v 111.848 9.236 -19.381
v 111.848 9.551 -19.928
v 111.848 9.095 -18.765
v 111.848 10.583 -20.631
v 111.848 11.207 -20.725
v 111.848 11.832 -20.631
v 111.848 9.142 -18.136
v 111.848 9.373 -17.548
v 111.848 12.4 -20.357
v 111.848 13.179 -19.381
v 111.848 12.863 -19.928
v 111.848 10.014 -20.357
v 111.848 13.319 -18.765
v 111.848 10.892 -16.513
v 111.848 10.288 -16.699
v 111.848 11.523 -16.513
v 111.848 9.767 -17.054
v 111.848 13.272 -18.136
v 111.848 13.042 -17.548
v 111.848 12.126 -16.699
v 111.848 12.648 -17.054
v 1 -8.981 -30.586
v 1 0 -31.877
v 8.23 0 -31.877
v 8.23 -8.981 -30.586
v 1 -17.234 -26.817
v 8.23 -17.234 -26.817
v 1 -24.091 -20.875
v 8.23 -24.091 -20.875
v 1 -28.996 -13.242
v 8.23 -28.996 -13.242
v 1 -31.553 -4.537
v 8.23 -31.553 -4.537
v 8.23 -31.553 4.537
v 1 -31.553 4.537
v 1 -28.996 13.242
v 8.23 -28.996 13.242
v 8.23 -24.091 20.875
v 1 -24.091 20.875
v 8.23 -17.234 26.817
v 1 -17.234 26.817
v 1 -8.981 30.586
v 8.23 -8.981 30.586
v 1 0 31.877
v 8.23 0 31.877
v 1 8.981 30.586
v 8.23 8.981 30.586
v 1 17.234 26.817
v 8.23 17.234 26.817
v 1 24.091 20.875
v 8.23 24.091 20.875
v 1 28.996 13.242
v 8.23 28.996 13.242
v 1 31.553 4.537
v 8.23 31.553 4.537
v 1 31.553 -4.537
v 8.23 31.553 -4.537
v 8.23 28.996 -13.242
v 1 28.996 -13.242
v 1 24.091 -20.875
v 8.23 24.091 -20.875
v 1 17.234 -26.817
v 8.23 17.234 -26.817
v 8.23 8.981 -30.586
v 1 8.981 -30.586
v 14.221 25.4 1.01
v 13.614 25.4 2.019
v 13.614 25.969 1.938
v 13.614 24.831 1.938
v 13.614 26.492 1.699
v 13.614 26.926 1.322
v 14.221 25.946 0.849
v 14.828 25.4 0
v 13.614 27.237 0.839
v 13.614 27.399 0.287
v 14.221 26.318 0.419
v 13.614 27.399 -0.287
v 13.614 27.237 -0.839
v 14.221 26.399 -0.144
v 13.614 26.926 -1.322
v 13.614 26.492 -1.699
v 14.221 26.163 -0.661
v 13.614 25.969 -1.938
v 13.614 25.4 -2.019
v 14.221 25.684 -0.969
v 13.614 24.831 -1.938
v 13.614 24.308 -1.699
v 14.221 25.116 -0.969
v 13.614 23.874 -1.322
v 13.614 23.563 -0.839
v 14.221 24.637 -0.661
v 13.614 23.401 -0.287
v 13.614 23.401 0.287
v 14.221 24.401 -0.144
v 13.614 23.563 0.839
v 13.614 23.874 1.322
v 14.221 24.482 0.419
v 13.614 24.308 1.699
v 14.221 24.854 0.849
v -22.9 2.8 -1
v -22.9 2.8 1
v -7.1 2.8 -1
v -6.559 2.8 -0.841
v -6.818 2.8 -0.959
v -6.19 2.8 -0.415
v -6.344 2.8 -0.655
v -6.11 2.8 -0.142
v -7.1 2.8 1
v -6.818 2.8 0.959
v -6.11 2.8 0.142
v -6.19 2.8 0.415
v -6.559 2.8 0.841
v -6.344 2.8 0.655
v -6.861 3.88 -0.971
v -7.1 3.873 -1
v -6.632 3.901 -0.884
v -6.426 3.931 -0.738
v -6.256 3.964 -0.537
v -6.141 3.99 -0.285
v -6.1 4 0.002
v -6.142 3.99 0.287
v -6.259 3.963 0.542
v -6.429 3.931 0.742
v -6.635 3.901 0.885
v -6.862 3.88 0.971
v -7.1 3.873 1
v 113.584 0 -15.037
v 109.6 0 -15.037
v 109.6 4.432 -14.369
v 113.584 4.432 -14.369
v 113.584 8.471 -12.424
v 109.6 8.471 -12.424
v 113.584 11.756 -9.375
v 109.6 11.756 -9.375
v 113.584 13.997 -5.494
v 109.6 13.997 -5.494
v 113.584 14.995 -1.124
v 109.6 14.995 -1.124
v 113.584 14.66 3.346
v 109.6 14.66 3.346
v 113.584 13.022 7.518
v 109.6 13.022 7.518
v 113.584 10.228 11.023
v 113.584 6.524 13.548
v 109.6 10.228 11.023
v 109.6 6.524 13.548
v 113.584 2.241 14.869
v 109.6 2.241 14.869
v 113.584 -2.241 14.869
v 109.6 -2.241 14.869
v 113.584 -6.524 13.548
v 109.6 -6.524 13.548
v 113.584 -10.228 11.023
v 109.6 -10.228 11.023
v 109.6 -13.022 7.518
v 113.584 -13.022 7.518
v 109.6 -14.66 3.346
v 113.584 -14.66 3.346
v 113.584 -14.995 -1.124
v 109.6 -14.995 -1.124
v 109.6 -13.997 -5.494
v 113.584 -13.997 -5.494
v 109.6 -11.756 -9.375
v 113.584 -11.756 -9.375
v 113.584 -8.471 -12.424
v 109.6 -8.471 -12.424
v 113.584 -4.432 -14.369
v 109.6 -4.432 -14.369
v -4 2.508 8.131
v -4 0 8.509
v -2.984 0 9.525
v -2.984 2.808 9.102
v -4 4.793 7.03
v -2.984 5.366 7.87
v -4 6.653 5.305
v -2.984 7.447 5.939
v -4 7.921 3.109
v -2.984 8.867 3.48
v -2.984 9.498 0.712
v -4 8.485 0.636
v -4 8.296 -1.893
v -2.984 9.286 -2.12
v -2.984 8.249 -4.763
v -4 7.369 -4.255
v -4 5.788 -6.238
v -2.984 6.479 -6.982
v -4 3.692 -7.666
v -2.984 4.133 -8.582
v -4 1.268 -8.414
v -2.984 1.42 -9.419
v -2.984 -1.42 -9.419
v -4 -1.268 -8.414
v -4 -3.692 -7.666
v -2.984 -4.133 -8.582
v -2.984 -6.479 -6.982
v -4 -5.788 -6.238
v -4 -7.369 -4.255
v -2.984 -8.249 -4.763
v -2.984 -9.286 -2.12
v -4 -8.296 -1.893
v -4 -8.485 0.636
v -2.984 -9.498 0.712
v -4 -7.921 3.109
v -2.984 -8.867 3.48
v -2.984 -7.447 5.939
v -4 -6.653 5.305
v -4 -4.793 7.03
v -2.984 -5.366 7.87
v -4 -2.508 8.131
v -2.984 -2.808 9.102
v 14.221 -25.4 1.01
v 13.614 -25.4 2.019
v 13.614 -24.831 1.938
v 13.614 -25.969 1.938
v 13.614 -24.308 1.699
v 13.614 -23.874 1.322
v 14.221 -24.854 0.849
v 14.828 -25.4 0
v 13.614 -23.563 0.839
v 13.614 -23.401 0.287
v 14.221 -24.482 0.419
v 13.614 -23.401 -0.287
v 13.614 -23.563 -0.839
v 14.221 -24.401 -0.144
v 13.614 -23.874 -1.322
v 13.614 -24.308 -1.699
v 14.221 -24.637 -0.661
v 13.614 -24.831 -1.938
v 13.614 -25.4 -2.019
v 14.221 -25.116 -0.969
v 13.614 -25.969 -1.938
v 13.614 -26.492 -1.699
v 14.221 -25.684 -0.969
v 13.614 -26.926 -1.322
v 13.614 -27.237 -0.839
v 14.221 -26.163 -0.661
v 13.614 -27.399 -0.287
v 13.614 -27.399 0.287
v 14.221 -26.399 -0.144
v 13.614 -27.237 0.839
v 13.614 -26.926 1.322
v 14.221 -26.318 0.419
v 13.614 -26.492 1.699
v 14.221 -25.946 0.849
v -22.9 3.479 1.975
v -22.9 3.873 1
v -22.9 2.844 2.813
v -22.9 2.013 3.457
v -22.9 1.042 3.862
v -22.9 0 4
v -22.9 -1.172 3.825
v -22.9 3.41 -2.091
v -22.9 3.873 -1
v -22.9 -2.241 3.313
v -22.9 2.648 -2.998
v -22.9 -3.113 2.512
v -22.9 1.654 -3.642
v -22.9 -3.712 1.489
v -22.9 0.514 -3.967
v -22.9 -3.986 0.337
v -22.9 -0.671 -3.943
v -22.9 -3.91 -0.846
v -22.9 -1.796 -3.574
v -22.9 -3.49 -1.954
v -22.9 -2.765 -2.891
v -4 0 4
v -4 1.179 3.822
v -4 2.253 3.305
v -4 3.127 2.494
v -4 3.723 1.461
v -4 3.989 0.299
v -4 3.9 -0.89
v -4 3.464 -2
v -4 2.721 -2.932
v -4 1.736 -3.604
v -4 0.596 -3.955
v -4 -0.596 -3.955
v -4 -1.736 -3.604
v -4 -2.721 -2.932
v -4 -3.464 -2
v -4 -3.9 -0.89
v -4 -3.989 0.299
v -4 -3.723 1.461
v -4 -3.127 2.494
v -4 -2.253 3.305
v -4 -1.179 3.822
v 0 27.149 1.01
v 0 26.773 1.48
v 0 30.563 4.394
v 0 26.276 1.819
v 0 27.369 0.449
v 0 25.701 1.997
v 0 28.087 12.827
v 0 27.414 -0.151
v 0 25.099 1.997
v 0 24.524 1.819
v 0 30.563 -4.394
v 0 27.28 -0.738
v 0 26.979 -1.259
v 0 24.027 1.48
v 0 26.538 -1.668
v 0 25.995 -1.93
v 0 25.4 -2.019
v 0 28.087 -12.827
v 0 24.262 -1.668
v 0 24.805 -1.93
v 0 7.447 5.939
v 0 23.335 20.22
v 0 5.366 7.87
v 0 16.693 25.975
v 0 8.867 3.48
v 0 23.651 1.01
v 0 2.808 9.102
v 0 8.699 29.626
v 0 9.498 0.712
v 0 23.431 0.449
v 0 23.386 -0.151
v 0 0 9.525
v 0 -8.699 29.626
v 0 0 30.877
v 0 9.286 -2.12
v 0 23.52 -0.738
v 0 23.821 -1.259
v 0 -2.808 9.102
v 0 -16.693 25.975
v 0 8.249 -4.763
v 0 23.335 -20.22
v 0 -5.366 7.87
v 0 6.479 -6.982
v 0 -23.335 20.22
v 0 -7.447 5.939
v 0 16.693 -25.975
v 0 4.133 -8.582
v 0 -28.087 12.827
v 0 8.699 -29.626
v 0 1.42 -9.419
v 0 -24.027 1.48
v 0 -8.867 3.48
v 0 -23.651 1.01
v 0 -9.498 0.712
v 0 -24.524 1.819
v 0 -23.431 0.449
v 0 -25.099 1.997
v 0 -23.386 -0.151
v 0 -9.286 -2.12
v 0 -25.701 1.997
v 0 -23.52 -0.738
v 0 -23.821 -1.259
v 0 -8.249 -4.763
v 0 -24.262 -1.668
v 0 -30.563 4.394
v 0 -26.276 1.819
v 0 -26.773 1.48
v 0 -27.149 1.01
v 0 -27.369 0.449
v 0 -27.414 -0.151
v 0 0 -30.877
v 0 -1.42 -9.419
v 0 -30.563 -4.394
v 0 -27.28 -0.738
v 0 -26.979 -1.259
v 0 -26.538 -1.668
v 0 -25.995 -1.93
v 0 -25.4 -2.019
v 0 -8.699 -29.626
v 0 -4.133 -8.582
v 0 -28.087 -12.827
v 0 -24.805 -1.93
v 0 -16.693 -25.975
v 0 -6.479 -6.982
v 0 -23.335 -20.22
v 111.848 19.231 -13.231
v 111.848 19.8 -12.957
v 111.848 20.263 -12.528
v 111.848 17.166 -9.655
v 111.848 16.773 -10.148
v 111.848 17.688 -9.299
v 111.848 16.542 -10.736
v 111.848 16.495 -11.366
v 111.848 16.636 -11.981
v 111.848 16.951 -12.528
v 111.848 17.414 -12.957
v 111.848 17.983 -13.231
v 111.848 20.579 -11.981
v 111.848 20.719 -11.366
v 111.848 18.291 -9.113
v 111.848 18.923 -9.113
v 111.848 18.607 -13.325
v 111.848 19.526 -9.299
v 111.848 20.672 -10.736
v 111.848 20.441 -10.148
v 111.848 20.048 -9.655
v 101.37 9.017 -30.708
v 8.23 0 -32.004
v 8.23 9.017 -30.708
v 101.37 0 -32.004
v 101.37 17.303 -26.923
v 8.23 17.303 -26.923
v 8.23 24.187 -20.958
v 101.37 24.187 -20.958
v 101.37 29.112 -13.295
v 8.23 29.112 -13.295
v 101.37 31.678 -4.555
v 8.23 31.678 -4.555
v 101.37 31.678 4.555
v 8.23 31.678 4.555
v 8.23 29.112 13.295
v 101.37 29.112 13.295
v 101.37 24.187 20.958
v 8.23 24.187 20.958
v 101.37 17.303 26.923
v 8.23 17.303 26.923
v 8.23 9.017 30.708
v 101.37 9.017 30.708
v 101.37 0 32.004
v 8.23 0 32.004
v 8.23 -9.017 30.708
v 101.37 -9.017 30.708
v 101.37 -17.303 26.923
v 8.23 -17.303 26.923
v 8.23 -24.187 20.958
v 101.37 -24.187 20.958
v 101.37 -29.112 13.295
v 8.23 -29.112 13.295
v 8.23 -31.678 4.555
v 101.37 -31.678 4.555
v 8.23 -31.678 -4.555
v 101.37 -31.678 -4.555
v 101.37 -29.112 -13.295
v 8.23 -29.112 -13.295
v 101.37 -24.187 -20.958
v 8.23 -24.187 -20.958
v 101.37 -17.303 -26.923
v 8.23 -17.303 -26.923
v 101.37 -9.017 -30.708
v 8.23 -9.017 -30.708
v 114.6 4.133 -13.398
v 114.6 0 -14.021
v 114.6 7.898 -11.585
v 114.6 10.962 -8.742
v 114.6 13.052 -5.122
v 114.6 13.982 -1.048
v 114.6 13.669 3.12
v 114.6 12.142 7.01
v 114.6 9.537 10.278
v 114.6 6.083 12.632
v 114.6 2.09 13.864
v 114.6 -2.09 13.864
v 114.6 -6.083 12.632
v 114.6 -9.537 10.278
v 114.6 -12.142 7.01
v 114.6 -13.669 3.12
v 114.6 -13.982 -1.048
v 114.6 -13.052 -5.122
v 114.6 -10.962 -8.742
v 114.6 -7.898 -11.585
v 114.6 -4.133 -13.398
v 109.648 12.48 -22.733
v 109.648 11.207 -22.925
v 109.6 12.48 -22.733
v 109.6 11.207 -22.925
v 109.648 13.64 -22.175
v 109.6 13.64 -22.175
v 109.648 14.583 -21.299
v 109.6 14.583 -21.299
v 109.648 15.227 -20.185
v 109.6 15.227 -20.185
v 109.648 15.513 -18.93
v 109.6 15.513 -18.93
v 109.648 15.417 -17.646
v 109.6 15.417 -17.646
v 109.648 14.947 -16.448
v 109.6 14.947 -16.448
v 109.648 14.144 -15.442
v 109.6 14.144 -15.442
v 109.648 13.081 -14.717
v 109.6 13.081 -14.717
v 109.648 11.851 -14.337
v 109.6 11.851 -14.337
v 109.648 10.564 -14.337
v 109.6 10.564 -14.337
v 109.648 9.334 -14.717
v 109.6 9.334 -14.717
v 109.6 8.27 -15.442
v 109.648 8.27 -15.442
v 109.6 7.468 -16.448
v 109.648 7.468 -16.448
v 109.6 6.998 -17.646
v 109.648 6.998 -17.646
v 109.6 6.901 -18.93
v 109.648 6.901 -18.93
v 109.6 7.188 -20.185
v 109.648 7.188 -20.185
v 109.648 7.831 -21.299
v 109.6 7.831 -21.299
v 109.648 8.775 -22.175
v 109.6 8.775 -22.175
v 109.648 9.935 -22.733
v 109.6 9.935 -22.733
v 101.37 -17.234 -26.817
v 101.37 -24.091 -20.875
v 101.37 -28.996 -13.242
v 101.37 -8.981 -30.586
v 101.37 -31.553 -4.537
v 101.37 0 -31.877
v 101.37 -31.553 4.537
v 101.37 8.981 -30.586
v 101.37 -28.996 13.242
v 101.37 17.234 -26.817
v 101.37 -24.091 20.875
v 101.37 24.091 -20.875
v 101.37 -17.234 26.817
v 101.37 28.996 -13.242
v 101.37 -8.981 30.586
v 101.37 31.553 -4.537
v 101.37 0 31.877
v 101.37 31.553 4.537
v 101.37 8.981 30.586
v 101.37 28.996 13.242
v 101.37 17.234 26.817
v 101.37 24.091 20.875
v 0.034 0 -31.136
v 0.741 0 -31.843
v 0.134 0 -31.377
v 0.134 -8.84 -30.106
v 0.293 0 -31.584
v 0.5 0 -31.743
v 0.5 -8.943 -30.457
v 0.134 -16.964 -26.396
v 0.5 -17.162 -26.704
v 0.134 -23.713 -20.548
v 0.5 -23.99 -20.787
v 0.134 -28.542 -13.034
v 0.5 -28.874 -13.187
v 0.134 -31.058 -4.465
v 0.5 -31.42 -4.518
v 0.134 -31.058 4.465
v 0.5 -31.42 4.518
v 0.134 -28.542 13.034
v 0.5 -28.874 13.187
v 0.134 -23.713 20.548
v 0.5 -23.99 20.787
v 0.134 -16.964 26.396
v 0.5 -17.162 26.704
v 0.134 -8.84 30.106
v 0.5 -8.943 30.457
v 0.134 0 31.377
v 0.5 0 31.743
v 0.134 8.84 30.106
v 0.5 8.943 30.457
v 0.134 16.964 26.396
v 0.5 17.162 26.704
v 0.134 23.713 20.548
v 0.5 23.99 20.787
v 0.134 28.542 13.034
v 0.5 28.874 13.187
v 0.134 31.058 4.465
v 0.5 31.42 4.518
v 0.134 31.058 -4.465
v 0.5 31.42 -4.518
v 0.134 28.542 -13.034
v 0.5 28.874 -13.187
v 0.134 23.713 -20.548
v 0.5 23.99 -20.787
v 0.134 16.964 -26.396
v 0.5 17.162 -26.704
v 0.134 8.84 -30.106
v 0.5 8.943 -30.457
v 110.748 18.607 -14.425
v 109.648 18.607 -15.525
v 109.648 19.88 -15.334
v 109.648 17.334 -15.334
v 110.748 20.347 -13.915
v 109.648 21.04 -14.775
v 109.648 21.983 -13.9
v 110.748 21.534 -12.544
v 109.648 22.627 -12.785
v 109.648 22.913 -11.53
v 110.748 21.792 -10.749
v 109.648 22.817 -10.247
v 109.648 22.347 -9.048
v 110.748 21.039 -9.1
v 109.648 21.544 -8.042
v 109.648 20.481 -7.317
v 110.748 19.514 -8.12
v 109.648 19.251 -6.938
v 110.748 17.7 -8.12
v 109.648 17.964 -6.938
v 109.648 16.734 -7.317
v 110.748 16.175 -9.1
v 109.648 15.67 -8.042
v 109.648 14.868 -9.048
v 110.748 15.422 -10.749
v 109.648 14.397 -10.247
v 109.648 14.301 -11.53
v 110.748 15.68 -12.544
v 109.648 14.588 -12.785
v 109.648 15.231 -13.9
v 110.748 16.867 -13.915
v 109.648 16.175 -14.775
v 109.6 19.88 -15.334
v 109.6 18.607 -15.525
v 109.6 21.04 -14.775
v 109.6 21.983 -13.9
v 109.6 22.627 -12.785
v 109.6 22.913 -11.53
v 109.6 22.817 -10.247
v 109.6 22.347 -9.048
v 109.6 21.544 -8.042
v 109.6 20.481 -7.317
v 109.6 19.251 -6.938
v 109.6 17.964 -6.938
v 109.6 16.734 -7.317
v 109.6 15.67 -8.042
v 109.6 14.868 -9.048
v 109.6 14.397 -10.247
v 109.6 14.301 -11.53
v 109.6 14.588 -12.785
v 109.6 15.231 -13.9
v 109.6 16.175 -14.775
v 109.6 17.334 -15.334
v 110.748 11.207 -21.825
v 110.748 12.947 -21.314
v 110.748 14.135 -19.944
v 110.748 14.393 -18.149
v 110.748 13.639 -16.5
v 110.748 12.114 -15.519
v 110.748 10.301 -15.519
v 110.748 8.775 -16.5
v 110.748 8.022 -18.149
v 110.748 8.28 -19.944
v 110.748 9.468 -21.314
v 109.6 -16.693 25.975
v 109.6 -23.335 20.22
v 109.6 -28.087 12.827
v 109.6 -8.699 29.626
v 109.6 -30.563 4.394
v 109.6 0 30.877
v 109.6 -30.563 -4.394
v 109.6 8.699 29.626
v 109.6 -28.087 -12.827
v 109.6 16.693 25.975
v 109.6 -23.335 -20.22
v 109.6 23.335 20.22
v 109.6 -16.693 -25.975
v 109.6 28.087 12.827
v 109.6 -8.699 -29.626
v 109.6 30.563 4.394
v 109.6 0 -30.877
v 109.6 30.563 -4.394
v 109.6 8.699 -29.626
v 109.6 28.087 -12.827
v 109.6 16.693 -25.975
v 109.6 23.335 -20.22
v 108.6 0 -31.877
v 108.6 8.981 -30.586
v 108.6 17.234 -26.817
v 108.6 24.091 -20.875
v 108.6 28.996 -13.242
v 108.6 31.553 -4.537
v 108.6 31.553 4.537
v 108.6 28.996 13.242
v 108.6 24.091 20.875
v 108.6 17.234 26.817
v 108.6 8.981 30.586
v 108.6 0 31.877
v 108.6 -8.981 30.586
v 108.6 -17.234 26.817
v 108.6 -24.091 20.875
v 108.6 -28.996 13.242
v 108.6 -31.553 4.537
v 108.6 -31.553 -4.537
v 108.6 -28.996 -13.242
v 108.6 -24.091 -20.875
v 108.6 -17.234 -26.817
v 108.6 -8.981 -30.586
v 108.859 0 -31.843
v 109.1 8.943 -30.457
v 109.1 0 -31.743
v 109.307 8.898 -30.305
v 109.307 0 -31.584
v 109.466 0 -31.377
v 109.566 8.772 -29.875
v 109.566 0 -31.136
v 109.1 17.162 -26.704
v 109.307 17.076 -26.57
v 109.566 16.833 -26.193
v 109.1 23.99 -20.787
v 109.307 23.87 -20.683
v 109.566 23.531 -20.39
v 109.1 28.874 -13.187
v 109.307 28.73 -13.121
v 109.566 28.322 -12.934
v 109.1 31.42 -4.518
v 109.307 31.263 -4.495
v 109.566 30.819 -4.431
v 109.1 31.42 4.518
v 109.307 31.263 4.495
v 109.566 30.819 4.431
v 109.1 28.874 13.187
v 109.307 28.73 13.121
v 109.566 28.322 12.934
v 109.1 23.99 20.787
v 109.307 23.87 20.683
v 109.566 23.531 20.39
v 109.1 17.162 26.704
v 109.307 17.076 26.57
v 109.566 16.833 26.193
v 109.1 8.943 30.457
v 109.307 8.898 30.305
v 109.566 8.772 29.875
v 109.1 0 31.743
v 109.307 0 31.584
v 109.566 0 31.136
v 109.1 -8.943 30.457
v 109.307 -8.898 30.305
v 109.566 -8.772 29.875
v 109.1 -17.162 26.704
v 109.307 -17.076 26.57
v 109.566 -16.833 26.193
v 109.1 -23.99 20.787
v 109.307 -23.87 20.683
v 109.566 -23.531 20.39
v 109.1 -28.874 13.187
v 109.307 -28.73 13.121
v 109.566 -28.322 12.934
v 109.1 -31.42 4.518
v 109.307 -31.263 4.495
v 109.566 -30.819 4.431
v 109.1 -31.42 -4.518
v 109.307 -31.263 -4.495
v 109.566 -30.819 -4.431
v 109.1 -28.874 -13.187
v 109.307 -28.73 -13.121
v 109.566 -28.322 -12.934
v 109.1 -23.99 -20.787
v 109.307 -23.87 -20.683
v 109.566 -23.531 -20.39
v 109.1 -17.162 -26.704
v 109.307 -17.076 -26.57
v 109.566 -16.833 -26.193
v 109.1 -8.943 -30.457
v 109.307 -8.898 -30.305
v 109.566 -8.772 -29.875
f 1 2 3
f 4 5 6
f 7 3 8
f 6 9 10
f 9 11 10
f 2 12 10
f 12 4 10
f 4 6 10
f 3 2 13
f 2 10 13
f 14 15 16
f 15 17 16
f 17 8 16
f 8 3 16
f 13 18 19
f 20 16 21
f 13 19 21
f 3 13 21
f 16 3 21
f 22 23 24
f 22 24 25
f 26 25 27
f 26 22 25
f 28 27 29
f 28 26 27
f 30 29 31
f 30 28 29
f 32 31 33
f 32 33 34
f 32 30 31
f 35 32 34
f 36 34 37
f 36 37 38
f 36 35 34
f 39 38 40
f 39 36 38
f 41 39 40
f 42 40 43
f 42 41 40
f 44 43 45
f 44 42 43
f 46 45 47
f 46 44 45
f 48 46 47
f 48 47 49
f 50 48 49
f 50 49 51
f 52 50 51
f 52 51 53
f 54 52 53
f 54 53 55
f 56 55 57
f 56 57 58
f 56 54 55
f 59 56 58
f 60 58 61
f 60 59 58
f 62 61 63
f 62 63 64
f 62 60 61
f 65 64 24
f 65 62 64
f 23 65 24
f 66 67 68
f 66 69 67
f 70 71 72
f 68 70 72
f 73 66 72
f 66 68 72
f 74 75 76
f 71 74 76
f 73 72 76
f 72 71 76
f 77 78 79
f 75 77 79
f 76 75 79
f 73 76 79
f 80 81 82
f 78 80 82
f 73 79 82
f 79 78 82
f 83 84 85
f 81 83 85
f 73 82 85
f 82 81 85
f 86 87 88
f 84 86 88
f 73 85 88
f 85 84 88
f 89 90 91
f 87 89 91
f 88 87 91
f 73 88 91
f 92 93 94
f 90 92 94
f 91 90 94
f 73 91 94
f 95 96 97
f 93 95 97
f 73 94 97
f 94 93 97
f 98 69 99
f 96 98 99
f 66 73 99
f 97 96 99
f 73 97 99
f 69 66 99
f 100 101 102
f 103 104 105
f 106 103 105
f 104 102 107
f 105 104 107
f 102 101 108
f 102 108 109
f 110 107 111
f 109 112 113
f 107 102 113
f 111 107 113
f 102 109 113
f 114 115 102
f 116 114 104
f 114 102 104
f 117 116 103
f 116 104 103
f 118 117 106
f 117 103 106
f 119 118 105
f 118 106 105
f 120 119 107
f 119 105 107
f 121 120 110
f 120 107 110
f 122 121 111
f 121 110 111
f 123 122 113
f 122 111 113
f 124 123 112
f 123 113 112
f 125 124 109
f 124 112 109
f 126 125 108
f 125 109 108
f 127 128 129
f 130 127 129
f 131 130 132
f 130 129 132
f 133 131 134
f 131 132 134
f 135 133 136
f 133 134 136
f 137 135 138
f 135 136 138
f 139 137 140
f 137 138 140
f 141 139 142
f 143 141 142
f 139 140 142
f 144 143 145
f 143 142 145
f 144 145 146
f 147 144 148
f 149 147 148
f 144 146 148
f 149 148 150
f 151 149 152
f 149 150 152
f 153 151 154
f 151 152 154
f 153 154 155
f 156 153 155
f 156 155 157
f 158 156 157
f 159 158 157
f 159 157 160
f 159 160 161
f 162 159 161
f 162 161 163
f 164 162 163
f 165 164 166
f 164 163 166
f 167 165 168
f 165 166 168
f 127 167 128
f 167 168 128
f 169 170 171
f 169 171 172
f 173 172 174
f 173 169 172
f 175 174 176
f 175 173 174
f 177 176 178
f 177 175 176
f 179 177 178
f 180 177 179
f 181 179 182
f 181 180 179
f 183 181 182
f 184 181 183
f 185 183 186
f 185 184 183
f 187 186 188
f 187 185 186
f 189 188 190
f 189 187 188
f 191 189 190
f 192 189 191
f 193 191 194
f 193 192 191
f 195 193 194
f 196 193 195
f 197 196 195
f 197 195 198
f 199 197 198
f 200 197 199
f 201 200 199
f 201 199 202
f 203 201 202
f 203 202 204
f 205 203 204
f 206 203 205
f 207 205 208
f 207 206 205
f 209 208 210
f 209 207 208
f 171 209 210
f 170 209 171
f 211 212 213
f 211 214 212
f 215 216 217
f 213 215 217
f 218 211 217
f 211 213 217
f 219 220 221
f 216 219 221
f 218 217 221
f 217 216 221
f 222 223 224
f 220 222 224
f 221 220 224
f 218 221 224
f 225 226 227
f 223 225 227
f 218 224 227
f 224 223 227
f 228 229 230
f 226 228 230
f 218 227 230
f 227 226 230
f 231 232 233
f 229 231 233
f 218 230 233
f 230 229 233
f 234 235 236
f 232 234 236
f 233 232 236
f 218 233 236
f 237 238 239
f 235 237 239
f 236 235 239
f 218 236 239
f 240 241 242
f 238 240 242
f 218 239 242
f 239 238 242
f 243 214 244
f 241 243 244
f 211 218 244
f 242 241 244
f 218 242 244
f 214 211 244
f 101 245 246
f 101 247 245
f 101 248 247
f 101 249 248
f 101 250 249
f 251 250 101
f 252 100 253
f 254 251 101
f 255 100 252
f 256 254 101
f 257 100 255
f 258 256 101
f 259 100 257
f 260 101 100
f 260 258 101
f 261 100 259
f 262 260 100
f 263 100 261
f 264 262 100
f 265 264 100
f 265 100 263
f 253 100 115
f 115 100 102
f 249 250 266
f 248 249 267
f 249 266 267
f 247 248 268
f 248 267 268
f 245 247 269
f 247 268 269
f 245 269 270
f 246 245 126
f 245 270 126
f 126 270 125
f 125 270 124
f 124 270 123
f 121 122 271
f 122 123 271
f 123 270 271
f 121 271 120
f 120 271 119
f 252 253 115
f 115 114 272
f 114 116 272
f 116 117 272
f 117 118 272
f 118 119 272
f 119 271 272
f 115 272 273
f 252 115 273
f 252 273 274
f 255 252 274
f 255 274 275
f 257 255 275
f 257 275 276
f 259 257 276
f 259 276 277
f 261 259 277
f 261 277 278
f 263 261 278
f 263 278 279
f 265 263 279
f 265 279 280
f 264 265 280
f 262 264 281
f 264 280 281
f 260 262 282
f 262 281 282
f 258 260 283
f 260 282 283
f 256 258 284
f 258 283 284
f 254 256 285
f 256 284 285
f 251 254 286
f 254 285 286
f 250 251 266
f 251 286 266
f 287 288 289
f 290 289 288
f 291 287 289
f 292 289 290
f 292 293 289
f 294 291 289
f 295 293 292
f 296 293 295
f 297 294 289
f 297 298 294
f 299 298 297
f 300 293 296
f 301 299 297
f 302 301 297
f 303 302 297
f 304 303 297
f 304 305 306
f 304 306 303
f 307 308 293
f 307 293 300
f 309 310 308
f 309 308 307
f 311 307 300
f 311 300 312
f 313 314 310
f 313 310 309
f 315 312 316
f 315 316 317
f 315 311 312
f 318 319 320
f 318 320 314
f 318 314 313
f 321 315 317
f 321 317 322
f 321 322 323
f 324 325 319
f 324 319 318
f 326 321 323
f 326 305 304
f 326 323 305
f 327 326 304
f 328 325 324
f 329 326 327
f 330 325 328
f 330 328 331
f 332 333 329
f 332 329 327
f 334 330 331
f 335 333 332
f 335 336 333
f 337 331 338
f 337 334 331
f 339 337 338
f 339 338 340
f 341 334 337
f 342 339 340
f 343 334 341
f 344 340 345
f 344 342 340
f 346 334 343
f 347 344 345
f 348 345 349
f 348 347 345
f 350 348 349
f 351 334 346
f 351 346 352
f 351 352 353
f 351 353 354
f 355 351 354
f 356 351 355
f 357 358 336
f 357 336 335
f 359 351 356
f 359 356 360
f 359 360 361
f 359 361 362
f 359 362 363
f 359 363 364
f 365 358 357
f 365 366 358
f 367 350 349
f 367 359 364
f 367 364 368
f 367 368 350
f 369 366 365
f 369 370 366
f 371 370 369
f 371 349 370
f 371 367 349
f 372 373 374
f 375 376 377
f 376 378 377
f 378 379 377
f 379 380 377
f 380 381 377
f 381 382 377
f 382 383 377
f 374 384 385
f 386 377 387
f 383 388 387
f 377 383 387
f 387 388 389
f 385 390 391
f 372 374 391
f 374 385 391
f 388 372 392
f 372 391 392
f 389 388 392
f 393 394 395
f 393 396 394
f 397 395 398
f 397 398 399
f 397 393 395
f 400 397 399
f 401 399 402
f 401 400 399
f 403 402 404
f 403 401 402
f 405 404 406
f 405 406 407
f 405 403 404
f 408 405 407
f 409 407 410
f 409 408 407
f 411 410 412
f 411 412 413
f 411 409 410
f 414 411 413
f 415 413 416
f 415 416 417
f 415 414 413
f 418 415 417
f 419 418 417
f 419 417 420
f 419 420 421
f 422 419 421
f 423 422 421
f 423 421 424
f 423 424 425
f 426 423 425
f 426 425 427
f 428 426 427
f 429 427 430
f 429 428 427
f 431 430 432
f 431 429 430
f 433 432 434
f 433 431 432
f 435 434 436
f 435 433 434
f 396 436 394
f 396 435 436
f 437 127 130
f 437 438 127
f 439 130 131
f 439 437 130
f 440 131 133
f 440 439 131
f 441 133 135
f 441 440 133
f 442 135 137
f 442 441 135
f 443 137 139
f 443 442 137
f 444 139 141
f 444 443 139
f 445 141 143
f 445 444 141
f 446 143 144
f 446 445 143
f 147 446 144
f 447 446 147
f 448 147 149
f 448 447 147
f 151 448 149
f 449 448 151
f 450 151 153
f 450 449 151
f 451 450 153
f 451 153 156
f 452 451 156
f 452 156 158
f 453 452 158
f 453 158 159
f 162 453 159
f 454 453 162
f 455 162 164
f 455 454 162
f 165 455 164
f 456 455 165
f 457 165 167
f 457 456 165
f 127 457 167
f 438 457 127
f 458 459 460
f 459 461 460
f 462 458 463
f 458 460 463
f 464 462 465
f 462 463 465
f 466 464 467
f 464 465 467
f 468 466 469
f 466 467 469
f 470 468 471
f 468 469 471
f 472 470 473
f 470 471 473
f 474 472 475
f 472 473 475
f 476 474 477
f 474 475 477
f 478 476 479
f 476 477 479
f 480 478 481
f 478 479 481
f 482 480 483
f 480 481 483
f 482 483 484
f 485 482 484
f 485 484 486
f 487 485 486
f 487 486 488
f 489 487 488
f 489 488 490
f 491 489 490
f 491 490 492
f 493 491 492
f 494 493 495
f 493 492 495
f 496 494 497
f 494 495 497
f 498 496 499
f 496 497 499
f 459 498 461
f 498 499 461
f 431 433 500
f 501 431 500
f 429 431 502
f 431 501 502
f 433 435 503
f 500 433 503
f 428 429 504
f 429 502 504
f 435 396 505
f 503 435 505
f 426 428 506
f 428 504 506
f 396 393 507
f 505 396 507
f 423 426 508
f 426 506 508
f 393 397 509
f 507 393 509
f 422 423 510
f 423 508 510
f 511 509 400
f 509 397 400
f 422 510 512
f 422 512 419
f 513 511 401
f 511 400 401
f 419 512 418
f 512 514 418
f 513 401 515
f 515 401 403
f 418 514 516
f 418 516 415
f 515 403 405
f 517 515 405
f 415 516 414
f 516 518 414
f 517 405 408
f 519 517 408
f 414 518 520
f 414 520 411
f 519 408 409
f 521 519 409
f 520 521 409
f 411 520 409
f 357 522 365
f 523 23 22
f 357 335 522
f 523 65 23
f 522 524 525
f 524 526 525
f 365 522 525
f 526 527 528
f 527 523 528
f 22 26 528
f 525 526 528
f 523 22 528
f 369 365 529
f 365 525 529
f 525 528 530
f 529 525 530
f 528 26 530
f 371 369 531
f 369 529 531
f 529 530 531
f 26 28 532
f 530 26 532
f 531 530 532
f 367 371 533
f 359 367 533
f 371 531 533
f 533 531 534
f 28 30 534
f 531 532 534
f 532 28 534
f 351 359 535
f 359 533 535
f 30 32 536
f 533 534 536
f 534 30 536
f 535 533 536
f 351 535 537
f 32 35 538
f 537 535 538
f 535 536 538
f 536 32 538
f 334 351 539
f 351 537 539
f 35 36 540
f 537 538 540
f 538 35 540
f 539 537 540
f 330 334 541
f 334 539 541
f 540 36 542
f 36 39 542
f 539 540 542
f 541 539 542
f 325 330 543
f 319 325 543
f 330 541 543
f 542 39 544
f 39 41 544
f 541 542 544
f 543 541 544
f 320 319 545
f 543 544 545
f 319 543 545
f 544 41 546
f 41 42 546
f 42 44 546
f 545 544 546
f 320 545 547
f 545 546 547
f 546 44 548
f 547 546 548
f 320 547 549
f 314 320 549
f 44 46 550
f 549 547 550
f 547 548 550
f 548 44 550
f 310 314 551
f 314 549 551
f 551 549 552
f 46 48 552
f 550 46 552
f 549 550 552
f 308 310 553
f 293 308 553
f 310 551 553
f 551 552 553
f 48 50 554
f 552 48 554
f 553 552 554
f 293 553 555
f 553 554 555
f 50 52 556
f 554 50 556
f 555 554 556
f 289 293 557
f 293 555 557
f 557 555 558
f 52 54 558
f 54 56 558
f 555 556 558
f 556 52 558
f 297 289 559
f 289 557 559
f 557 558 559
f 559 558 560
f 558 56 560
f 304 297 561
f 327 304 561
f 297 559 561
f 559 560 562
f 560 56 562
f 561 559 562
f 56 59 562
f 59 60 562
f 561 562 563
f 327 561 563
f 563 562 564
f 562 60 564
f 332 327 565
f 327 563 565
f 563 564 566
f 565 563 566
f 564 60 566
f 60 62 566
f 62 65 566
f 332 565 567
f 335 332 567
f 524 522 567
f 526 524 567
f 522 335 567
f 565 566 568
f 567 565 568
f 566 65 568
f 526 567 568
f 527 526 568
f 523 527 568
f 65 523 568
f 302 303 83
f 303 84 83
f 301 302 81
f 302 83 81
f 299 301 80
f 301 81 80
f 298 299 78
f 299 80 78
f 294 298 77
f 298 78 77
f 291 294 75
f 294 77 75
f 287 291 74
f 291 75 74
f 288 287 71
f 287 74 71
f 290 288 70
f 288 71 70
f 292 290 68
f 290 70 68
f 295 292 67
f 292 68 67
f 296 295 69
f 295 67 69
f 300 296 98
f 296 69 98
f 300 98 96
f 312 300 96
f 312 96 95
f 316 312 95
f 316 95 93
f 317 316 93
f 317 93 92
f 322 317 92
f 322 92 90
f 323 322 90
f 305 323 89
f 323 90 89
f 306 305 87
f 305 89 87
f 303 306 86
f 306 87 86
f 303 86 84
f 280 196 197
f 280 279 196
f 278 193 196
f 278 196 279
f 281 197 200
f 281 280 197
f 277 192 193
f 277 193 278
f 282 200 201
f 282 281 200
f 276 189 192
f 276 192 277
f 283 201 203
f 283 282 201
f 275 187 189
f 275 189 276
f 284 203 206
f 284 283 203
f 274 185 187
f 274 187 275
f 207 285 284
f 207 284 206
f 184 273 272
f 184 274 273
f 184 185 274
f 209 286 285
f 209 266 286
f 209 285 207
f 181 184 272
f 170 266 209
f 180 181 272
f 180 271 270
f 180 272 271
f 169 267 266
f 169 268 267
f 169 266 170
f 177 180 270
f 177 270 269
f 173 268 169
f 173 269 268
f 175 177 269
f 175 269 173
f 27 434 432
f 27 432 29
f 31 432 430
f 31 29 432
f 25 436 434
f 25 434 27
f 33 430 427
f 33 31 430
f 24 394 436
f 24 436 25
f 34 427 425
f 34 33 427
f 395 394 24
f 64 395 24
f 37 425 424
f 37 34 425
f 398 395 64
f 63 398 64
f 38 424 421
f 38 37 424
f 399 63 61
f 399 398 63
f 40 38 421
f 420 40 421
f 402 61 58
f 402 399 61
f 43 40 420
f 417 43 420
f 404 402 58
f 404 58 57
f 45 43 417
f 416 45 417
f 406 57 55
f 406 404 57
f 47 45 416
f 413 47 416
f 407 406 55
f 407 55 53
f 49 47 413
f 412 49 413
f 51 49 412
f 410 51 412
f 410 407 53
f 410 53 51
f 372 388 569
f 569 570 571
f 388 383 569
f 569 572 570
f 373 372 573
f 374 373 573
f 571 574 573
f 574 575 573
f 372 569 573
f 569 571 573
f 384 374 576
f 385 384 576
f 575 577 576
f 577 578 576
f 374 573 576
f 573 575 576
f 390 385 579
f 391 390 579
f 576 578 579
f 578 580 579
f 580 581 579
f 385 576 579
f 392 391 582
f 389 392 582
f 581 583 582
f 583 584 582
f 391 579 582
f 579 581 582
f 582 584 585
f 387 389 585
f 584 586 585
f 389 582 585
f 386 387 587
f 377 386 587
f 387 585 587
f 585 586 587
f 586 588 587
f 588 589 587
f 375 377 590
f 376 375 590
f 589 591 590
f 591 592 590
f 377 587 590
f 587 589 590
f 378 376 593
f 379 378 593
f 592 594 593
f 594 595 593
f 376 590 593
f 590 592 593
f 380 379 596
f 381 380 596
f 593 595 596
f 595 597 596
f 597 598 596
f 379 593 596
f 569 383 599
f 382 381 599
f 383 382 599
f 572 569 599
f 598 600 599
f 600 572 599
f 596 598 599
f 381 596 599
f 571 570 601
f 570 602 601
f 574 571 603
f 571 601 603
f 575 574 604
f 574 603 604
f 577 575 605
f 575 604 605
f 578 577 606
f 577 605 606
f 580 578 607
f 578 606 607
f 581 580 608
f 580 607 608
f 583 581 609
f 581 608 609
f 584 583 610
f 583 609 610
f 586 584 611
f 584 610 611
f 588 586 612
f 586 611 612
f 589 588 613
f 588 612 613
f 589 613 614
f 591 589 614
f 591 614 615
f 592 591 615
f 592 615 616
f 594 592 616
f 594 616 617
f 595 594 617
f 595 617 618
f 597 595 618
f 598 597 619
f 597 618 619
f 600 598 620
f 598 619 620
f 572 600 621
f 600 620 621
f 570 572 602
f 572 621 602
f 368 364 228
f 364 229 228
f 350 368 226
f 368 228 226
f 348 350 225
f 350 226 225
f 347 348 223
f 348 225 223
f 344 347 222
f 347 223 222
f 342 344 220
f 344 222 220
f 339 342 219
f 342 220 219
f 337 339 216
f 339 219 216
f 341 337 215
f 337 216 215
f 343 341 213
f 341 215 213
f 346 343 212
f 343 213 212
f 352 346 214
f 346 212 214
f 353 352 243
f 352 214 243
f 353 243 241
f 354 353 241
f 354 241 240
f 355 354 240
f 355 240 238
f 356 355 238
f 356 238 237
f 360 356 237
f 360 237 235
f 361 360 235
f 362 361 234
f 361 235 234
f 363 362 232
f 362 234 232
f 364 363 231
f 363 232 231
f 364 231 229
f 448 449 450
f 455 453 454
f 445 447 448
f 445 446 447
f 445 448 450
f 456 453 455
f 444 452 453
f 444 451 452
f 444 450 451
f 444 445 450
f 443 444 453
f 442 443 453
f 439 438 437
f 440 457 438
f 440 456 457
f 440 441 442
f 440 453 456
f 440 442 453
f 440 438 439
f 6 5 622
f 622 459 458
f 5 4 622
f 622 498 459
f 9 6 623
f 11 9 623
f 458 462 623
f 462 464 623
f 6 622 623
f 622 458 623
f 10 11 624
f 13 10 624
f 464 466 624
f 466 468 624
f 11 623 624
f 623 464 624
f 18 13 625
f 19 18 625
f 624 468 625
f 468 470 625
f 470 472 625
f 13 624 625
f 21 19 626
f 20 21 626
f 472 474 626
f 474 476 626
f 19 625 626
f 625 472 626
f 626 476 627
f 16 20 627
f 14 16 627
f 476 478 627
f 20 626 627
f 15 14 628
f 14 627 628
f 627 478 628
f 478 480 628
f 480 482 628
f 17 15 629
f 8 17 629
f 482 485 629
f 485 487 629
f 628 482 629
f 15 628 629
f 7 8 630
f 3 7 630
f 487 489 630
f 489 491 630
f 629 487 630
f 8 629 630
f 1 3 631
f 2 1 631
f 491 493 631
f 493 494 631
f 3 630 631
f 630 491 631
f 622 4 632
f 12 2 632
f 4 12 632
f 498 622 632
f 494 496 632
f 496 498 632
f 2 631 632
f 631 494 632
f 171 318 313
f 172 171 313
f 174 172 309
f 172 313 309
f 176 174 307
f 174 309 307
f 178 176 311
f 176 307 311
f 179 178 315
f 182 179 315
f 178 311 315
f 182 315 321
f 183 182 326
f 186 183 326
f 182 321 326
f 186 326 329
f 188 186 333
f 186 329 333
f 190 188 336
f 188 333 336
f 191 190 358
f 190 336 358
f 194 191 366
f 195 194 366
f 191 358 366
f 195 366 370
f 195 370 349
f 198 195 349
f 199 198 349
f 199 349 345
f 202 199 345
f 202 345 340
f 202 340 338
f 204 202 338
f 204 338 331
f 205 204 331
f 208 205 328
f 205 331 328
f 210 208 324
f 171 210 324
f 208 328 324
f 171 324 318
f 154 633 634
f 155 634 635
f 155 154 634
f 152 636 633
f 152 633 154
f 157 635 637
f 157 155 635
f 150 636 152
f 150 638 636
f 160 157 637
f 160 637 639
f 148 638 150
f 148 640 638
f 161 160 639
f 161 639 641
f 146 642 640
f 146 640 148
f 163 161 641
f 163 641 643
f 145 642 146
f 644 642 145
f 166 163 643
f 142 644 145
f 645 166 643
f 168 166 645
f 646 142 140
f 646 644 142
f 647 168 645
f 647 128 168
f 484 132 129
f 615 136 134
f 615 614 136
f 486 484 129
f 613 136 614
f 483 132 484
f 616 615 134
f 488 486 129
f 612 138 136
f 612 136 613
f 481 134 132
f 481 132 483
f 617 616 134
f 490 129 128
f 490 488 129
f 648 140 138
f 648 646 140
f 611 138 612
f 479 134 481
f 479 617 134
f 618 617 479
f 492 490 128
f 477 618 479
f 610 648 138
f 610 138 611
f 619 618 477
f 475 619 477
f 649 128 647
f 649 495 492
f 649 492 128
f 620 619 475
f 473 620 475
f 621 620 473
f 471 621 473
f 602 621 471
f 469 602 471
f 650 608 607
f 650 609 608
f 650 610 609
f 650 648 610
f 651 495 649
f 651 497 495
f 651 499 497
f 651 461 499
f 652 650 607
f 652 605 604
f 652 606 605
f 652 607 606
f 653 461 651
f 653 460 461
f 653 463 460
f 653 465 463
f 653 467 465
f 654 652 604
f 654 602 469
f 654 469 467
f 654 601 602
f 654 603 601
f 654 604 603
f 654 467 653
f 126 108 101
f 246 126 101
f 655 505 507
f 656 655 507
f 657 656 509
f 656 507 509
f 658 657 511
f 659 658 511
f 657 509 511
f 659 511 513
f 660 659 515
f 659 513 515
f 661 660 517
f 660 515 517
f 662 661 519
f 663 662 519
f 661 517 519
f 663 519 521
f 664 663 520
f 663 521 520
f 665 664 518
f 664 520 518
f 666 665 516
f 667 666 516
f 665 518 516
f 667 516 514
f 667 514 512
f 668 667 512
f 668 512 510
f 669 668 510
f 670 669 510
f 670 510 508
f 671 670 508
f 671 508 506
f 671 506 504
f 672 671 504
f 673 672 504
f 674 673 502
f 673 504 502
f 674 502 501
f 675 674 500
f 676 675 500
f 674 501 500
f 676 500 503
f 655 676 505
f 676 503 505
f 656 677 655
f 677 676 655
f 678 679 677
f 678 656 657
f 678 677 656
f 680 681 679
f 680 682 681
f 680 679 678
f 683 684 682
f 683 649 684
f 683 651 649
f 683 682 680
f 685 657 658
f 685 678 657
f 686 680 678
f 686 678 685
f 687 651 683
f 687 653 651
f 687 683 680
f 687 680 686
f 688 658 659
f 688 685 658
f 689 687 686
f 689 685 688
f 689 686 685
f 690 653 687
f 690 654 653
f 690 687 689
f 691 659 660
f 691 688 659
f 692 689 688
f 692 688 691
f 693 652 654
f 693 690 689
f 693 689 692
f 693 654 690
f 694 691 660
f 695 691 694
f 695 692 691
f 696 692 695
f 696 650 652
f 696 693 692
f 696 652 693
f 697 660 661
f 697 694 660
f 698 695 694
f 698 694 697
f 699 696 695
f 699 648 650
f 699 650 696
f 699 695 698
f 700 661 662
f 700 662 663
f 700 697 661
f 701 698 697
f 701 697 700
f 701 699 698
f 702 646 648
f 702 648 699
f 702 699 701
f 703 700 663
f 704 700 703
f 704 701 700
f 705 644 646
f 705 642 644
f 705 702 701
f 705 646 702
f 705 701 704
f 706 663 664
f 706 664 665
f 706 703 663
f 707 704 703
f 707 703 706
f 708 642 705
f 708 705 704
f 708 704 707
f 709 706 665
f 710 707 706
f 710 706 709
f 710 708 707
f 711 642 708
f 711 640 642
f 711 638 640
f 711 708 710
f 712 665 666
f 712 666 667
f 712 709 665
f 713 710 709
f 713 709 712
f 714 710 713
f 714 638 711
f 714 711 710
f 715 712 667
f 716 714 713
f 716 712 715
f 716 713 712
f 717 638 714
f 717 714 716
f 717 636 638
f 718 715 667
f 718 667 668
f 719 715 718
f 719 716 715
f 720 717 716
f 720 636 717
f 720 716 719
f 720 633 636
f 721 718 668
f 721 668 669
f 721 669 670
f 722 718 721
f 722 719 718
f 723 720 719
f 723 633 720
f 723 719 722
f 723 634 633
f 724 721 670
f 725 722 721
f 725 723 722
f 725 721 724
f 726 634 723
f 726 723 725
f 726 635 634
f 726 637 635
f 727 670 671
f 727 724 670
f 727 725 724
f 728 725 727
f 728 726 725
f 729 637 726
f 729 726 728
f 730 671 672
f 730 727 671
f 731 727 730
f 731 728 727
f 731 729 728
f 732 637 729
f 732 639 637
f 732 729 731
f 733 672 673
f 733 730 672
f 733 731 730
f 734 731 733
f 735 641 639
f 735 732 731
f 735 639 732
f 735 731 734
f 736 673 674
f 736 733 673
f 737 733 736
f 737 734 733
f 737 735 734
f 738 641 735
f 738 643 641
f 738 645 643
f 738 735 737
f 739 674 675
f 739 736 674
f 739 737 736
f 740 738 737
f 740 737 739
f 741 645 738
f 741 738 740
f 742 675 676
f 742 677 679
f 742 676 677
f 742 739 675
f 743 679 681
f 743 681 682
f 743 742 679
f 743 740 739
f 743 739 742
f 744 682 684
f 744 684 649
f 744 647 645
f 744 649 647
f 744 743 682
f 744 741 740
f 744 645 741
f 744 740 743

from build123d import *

# Parameters (mm, degrees)
SKETCH1_W                  = 93.1408
SKETCH1_H                  = 32.004
SKETCH2_R                  = 31.877
BOSS_EXTRUDE1_DEPTH        = 8.2296
SKETCH3_R                  = 15.0368
BOSS_EXTRUDE2_DEPTH        = 3.984
SKETCH4_R                  = 15.0368
BOSS_EXTRUDE3_DEPTH        = 1.016
BOSS_EXTRUDE3_TAPER        = 45
BOSS_EXTRUDE4_START        = 8.2296
SKETCH5_R                  = 31.877
BOSS_EXTRUDE4_DEPTH        = 8.2296
SKETCH6_R                  = 9.525
BOSS_EXTRUDE5_DEPTH        = 4
SKETCH7_R                  = 4
BOSS_EXTRUDE6_DEPTH        = 31.6
CUT_EXTRUDE1_REACH         = 125.971
CUT_EXTRUDE1_END_RADIUS    = 4
M3_5_CLEARANCE_HOLE1_D     = 4.0386
M3_5_CLEARANCE_HOLE1_DEPTH = 13.6144
M3_5_CLEARANCE_HOLE1_TIP   = 1.213317848
CHAMFER1_SIZE              = 1.016
CHAMFER2_SIZE              = 0.5
FILLET1_R                  = 1
CUT_EXTRUDE2_DEPTH         = 124.213928007
CUT_EXTRUDE2_DEPTH_BACK    = 124.213928007
SKETCH13_W                 = 12.7
SKETCH13_H                 = 41.153791371


with BuildPart() as part:
    # Sketch1 → Revolve1 (revolve)
    with BuildSketch(Plane.XY, mode=Mode.PRIVATE) as revolve1_sk:
        with Locations((54.8, 16.002)):
            Rectangle(SKETCH1_W, SKETCH1_H)
    revolve(revolve1_sk.sketch.rotate(Axis((8.2296, 0, 0), (1, 0, 0)), 270), axis=Axis((8.2296, 0, 0), (1, 0, 0)))

    # Sketch2 → Boss-Extrude1 (add)
    with BuildSketch(Plane(origin=(101.3704, 0, 0), x_dir=(0, 0, -1), z_dir=(1, 0, 0))):
        Circle(SKETCH2_R)
    extrude(amount=BOSS_EXTRUDE1_DEPTH)

    # Sketch3 → Boss-Extrude2 (add)
    with BuildSketch(Plane(origin=(109.6, 0, 0), x_dir=(0, 0, -1), z_dir=(1, 0, 0))):
        Circle(SKETCH3_R)
    extrude(amount=BOSS_EXTRUDE2_DEPTH)

    # Sketch4 → Boss-Extrude3 (add)
    with BuildSketch(Plane(origin=(113.584, 0, 0), x_dir=(0, 0, -1), z_dir=(1, 0, 0))):
        Circle(SKETCH4_R)
    extrude(amount=BOSS_EXTRUDE3_DEPTH, taper=BOSS_EXTRUDE3_TAPER)

    # Sketch5 → Boss-Extrude4 (add)
    with BuildSketch(Plane.ZY.offset(-8.2296).offset(BOSS_EXTRUDE4_START)):
        with Locations(Location((0, 0, 0), (0, 0, 180))):
            Circle(SKETCH5_R)
    extrude(amount=-BOSS_EXTRUDE4_DEPTH)

    # Sketch6 → Boss-Extrude5 (add)
    with BuildSketch(Plane.ZY):
        Circle(SKETCH6_R)
    extrude(amount=BOSS_EXTRUDE5_DEPTH)

    # Sketch7 → Boss-Extrude6 (add)
    with BuildSketch(Plane.ZY.offset(4)):
        Circle(SKETCH7_R)
    extrude(amount=BOSS_EXTRUDE6_DEPTH)

    # Cut-Extrude1: up to this cylinder (the profile starts inside it)
    cut_extrude1_end = Plane(origin=(-16.85, 0, 0), z_dir=(1, 0, 0)) * Cylinder(CUT_EXTRUDE1_END_RADIUS, 260.942, mode=Mode.PRIVATE)
    # Sketch8 → Cut-Extrude1 (cut, up to the surface)
    with BuildSketch(Plane.XZ.offset(-2.8), mode=Mode.PRIVATE) as cut_extrude1_sk1:
        with BuildLine():
            Line((-7.1, 1), (-26.6, 1))
            ThreePointArc((-26.6, 1), (-27.6, 0), (-26.6, -1))
            Line((-26.6, -1), (-7.1, -1))
            ThreePointArc((-7.1, -1), (-6.1, 0), (-7.1, 1))
        make_face()
    cut_extrude1_tool1 = extrude(cut_extrude1_sk1.sketch, amount=-CUT_EXTRUDE1_REACH, mode=Mode.PRIVATE) & cut_extrude1_end
    add(cut_extrude1_tool1.solids().sort_by_distance((-16.85, 2.8, 0))[0], mode=Mode.SUBTRACT)

    # Sketch9 → Revolve2 (revolve)
    with BuildSketch(Plane.XY.offset(-18.607090683), mode=Mode.PRIVATE) as revolve2_sk:
        Polygon((109.6, 15.525359639), (109.6, 11.207359639), (111.8479, 11.207359639), (111.8479, 13.325359639), (109.6479, 15.525359639), align=None)
    revolve(revolve2_sk.sketch.rotate(Axis((109.6, 11.207359639, -18.607090683), (1, 0, 0)), 270), axis=Axis((109.6, 11.207359639, -18.607090683), (1, 0, 0)))

    # Sketch10 → Revolve3 (revolve)
    with BuildSketch(Plane.XY.offset(-11.207359639), mode=Mode.PRIVATE) as revolve3_sk:
        Polygon((109.6, 22.925090683), (109.6, 18.607090683), (111.8479, 18.607090683), (111.8479, 20.725090683), (109.6479, 22.925090683), align=None)
    revolve(revolve3_sk.sketch.rotate(Axis((109.6, 18.607090683, -11.207359639), (1, 0, 0)), 270), axis=Axis((109.6, 18.607090683, -11.207359639), (1, 0, 0)))

    # M3.5 Clearance Hole1
    with Locations(Plane.ZY):
        with Locations((0, 25.4), (0, -25.4)):
            Hole(M3_5_CLEARANCE_HOLE1_D / 2, depth=M3_5_CLEARANCE_HOLE1_DEPTH)
            with Locations((0, 0, -(M3_5_CLEARANCE_HOLE1_DEPTH + M3_5_CLEARANCE_HOLE1_TIP / 2))):  # 118° drill point
                Cone(0, M3_5_CLEARANCE_HOLE1_D / 2, M3_5_CLEARANCE_HOLE1_TIP, mode=Mode.SUBTRACT)

    # Chamfer1
    chamfer1_edges = [part.edges().sort_by_distance(p)[0] for p in [
        (-4, 0, -9.525),
    ]]
    chamfer(chamfer1_edges, length=CHAMFER1_SIZE)

    # Chamfer2
    chamfer2_edges = [part.edges().sort_by_distance(p)[0] for p in [
        (-35.6, 0, -4),
    ]]
    chamfer(chamfer2_edges, length=CHAMFER2_SIZE)

    # Fillet1
    fillet1_edges = [part.edges().sort_by_distance(p)[0] for p in [
        (0, 0, 31.877),
        (109.6, 0, 31.877),
    ]]
    fillet(fillet1_edges, radius=FILLET1_R)

    # Sketch13 → Cut-Extrude2 (cut, two sides: drawn at the far end of the back side and taken through both)
    with BuildSketch(Plane(origin=(0, 0, 0), x_dir=(1, 0, 0), z_dir=(0, 1, 0)).offset(-CUT_EXTRUDE2_DEPTH_BACK)):
        with Locations((-29.25, 3.599946583)):
            Rectangle(SKETCH13_W, SKETCH13_H)
    extrude(amount=CUT_EXTRUDE2_DEPTH + CUT_EXTRUDE2_DEPTH_BACK, mode=Mode.SUBTRACT)


solid = part.part
